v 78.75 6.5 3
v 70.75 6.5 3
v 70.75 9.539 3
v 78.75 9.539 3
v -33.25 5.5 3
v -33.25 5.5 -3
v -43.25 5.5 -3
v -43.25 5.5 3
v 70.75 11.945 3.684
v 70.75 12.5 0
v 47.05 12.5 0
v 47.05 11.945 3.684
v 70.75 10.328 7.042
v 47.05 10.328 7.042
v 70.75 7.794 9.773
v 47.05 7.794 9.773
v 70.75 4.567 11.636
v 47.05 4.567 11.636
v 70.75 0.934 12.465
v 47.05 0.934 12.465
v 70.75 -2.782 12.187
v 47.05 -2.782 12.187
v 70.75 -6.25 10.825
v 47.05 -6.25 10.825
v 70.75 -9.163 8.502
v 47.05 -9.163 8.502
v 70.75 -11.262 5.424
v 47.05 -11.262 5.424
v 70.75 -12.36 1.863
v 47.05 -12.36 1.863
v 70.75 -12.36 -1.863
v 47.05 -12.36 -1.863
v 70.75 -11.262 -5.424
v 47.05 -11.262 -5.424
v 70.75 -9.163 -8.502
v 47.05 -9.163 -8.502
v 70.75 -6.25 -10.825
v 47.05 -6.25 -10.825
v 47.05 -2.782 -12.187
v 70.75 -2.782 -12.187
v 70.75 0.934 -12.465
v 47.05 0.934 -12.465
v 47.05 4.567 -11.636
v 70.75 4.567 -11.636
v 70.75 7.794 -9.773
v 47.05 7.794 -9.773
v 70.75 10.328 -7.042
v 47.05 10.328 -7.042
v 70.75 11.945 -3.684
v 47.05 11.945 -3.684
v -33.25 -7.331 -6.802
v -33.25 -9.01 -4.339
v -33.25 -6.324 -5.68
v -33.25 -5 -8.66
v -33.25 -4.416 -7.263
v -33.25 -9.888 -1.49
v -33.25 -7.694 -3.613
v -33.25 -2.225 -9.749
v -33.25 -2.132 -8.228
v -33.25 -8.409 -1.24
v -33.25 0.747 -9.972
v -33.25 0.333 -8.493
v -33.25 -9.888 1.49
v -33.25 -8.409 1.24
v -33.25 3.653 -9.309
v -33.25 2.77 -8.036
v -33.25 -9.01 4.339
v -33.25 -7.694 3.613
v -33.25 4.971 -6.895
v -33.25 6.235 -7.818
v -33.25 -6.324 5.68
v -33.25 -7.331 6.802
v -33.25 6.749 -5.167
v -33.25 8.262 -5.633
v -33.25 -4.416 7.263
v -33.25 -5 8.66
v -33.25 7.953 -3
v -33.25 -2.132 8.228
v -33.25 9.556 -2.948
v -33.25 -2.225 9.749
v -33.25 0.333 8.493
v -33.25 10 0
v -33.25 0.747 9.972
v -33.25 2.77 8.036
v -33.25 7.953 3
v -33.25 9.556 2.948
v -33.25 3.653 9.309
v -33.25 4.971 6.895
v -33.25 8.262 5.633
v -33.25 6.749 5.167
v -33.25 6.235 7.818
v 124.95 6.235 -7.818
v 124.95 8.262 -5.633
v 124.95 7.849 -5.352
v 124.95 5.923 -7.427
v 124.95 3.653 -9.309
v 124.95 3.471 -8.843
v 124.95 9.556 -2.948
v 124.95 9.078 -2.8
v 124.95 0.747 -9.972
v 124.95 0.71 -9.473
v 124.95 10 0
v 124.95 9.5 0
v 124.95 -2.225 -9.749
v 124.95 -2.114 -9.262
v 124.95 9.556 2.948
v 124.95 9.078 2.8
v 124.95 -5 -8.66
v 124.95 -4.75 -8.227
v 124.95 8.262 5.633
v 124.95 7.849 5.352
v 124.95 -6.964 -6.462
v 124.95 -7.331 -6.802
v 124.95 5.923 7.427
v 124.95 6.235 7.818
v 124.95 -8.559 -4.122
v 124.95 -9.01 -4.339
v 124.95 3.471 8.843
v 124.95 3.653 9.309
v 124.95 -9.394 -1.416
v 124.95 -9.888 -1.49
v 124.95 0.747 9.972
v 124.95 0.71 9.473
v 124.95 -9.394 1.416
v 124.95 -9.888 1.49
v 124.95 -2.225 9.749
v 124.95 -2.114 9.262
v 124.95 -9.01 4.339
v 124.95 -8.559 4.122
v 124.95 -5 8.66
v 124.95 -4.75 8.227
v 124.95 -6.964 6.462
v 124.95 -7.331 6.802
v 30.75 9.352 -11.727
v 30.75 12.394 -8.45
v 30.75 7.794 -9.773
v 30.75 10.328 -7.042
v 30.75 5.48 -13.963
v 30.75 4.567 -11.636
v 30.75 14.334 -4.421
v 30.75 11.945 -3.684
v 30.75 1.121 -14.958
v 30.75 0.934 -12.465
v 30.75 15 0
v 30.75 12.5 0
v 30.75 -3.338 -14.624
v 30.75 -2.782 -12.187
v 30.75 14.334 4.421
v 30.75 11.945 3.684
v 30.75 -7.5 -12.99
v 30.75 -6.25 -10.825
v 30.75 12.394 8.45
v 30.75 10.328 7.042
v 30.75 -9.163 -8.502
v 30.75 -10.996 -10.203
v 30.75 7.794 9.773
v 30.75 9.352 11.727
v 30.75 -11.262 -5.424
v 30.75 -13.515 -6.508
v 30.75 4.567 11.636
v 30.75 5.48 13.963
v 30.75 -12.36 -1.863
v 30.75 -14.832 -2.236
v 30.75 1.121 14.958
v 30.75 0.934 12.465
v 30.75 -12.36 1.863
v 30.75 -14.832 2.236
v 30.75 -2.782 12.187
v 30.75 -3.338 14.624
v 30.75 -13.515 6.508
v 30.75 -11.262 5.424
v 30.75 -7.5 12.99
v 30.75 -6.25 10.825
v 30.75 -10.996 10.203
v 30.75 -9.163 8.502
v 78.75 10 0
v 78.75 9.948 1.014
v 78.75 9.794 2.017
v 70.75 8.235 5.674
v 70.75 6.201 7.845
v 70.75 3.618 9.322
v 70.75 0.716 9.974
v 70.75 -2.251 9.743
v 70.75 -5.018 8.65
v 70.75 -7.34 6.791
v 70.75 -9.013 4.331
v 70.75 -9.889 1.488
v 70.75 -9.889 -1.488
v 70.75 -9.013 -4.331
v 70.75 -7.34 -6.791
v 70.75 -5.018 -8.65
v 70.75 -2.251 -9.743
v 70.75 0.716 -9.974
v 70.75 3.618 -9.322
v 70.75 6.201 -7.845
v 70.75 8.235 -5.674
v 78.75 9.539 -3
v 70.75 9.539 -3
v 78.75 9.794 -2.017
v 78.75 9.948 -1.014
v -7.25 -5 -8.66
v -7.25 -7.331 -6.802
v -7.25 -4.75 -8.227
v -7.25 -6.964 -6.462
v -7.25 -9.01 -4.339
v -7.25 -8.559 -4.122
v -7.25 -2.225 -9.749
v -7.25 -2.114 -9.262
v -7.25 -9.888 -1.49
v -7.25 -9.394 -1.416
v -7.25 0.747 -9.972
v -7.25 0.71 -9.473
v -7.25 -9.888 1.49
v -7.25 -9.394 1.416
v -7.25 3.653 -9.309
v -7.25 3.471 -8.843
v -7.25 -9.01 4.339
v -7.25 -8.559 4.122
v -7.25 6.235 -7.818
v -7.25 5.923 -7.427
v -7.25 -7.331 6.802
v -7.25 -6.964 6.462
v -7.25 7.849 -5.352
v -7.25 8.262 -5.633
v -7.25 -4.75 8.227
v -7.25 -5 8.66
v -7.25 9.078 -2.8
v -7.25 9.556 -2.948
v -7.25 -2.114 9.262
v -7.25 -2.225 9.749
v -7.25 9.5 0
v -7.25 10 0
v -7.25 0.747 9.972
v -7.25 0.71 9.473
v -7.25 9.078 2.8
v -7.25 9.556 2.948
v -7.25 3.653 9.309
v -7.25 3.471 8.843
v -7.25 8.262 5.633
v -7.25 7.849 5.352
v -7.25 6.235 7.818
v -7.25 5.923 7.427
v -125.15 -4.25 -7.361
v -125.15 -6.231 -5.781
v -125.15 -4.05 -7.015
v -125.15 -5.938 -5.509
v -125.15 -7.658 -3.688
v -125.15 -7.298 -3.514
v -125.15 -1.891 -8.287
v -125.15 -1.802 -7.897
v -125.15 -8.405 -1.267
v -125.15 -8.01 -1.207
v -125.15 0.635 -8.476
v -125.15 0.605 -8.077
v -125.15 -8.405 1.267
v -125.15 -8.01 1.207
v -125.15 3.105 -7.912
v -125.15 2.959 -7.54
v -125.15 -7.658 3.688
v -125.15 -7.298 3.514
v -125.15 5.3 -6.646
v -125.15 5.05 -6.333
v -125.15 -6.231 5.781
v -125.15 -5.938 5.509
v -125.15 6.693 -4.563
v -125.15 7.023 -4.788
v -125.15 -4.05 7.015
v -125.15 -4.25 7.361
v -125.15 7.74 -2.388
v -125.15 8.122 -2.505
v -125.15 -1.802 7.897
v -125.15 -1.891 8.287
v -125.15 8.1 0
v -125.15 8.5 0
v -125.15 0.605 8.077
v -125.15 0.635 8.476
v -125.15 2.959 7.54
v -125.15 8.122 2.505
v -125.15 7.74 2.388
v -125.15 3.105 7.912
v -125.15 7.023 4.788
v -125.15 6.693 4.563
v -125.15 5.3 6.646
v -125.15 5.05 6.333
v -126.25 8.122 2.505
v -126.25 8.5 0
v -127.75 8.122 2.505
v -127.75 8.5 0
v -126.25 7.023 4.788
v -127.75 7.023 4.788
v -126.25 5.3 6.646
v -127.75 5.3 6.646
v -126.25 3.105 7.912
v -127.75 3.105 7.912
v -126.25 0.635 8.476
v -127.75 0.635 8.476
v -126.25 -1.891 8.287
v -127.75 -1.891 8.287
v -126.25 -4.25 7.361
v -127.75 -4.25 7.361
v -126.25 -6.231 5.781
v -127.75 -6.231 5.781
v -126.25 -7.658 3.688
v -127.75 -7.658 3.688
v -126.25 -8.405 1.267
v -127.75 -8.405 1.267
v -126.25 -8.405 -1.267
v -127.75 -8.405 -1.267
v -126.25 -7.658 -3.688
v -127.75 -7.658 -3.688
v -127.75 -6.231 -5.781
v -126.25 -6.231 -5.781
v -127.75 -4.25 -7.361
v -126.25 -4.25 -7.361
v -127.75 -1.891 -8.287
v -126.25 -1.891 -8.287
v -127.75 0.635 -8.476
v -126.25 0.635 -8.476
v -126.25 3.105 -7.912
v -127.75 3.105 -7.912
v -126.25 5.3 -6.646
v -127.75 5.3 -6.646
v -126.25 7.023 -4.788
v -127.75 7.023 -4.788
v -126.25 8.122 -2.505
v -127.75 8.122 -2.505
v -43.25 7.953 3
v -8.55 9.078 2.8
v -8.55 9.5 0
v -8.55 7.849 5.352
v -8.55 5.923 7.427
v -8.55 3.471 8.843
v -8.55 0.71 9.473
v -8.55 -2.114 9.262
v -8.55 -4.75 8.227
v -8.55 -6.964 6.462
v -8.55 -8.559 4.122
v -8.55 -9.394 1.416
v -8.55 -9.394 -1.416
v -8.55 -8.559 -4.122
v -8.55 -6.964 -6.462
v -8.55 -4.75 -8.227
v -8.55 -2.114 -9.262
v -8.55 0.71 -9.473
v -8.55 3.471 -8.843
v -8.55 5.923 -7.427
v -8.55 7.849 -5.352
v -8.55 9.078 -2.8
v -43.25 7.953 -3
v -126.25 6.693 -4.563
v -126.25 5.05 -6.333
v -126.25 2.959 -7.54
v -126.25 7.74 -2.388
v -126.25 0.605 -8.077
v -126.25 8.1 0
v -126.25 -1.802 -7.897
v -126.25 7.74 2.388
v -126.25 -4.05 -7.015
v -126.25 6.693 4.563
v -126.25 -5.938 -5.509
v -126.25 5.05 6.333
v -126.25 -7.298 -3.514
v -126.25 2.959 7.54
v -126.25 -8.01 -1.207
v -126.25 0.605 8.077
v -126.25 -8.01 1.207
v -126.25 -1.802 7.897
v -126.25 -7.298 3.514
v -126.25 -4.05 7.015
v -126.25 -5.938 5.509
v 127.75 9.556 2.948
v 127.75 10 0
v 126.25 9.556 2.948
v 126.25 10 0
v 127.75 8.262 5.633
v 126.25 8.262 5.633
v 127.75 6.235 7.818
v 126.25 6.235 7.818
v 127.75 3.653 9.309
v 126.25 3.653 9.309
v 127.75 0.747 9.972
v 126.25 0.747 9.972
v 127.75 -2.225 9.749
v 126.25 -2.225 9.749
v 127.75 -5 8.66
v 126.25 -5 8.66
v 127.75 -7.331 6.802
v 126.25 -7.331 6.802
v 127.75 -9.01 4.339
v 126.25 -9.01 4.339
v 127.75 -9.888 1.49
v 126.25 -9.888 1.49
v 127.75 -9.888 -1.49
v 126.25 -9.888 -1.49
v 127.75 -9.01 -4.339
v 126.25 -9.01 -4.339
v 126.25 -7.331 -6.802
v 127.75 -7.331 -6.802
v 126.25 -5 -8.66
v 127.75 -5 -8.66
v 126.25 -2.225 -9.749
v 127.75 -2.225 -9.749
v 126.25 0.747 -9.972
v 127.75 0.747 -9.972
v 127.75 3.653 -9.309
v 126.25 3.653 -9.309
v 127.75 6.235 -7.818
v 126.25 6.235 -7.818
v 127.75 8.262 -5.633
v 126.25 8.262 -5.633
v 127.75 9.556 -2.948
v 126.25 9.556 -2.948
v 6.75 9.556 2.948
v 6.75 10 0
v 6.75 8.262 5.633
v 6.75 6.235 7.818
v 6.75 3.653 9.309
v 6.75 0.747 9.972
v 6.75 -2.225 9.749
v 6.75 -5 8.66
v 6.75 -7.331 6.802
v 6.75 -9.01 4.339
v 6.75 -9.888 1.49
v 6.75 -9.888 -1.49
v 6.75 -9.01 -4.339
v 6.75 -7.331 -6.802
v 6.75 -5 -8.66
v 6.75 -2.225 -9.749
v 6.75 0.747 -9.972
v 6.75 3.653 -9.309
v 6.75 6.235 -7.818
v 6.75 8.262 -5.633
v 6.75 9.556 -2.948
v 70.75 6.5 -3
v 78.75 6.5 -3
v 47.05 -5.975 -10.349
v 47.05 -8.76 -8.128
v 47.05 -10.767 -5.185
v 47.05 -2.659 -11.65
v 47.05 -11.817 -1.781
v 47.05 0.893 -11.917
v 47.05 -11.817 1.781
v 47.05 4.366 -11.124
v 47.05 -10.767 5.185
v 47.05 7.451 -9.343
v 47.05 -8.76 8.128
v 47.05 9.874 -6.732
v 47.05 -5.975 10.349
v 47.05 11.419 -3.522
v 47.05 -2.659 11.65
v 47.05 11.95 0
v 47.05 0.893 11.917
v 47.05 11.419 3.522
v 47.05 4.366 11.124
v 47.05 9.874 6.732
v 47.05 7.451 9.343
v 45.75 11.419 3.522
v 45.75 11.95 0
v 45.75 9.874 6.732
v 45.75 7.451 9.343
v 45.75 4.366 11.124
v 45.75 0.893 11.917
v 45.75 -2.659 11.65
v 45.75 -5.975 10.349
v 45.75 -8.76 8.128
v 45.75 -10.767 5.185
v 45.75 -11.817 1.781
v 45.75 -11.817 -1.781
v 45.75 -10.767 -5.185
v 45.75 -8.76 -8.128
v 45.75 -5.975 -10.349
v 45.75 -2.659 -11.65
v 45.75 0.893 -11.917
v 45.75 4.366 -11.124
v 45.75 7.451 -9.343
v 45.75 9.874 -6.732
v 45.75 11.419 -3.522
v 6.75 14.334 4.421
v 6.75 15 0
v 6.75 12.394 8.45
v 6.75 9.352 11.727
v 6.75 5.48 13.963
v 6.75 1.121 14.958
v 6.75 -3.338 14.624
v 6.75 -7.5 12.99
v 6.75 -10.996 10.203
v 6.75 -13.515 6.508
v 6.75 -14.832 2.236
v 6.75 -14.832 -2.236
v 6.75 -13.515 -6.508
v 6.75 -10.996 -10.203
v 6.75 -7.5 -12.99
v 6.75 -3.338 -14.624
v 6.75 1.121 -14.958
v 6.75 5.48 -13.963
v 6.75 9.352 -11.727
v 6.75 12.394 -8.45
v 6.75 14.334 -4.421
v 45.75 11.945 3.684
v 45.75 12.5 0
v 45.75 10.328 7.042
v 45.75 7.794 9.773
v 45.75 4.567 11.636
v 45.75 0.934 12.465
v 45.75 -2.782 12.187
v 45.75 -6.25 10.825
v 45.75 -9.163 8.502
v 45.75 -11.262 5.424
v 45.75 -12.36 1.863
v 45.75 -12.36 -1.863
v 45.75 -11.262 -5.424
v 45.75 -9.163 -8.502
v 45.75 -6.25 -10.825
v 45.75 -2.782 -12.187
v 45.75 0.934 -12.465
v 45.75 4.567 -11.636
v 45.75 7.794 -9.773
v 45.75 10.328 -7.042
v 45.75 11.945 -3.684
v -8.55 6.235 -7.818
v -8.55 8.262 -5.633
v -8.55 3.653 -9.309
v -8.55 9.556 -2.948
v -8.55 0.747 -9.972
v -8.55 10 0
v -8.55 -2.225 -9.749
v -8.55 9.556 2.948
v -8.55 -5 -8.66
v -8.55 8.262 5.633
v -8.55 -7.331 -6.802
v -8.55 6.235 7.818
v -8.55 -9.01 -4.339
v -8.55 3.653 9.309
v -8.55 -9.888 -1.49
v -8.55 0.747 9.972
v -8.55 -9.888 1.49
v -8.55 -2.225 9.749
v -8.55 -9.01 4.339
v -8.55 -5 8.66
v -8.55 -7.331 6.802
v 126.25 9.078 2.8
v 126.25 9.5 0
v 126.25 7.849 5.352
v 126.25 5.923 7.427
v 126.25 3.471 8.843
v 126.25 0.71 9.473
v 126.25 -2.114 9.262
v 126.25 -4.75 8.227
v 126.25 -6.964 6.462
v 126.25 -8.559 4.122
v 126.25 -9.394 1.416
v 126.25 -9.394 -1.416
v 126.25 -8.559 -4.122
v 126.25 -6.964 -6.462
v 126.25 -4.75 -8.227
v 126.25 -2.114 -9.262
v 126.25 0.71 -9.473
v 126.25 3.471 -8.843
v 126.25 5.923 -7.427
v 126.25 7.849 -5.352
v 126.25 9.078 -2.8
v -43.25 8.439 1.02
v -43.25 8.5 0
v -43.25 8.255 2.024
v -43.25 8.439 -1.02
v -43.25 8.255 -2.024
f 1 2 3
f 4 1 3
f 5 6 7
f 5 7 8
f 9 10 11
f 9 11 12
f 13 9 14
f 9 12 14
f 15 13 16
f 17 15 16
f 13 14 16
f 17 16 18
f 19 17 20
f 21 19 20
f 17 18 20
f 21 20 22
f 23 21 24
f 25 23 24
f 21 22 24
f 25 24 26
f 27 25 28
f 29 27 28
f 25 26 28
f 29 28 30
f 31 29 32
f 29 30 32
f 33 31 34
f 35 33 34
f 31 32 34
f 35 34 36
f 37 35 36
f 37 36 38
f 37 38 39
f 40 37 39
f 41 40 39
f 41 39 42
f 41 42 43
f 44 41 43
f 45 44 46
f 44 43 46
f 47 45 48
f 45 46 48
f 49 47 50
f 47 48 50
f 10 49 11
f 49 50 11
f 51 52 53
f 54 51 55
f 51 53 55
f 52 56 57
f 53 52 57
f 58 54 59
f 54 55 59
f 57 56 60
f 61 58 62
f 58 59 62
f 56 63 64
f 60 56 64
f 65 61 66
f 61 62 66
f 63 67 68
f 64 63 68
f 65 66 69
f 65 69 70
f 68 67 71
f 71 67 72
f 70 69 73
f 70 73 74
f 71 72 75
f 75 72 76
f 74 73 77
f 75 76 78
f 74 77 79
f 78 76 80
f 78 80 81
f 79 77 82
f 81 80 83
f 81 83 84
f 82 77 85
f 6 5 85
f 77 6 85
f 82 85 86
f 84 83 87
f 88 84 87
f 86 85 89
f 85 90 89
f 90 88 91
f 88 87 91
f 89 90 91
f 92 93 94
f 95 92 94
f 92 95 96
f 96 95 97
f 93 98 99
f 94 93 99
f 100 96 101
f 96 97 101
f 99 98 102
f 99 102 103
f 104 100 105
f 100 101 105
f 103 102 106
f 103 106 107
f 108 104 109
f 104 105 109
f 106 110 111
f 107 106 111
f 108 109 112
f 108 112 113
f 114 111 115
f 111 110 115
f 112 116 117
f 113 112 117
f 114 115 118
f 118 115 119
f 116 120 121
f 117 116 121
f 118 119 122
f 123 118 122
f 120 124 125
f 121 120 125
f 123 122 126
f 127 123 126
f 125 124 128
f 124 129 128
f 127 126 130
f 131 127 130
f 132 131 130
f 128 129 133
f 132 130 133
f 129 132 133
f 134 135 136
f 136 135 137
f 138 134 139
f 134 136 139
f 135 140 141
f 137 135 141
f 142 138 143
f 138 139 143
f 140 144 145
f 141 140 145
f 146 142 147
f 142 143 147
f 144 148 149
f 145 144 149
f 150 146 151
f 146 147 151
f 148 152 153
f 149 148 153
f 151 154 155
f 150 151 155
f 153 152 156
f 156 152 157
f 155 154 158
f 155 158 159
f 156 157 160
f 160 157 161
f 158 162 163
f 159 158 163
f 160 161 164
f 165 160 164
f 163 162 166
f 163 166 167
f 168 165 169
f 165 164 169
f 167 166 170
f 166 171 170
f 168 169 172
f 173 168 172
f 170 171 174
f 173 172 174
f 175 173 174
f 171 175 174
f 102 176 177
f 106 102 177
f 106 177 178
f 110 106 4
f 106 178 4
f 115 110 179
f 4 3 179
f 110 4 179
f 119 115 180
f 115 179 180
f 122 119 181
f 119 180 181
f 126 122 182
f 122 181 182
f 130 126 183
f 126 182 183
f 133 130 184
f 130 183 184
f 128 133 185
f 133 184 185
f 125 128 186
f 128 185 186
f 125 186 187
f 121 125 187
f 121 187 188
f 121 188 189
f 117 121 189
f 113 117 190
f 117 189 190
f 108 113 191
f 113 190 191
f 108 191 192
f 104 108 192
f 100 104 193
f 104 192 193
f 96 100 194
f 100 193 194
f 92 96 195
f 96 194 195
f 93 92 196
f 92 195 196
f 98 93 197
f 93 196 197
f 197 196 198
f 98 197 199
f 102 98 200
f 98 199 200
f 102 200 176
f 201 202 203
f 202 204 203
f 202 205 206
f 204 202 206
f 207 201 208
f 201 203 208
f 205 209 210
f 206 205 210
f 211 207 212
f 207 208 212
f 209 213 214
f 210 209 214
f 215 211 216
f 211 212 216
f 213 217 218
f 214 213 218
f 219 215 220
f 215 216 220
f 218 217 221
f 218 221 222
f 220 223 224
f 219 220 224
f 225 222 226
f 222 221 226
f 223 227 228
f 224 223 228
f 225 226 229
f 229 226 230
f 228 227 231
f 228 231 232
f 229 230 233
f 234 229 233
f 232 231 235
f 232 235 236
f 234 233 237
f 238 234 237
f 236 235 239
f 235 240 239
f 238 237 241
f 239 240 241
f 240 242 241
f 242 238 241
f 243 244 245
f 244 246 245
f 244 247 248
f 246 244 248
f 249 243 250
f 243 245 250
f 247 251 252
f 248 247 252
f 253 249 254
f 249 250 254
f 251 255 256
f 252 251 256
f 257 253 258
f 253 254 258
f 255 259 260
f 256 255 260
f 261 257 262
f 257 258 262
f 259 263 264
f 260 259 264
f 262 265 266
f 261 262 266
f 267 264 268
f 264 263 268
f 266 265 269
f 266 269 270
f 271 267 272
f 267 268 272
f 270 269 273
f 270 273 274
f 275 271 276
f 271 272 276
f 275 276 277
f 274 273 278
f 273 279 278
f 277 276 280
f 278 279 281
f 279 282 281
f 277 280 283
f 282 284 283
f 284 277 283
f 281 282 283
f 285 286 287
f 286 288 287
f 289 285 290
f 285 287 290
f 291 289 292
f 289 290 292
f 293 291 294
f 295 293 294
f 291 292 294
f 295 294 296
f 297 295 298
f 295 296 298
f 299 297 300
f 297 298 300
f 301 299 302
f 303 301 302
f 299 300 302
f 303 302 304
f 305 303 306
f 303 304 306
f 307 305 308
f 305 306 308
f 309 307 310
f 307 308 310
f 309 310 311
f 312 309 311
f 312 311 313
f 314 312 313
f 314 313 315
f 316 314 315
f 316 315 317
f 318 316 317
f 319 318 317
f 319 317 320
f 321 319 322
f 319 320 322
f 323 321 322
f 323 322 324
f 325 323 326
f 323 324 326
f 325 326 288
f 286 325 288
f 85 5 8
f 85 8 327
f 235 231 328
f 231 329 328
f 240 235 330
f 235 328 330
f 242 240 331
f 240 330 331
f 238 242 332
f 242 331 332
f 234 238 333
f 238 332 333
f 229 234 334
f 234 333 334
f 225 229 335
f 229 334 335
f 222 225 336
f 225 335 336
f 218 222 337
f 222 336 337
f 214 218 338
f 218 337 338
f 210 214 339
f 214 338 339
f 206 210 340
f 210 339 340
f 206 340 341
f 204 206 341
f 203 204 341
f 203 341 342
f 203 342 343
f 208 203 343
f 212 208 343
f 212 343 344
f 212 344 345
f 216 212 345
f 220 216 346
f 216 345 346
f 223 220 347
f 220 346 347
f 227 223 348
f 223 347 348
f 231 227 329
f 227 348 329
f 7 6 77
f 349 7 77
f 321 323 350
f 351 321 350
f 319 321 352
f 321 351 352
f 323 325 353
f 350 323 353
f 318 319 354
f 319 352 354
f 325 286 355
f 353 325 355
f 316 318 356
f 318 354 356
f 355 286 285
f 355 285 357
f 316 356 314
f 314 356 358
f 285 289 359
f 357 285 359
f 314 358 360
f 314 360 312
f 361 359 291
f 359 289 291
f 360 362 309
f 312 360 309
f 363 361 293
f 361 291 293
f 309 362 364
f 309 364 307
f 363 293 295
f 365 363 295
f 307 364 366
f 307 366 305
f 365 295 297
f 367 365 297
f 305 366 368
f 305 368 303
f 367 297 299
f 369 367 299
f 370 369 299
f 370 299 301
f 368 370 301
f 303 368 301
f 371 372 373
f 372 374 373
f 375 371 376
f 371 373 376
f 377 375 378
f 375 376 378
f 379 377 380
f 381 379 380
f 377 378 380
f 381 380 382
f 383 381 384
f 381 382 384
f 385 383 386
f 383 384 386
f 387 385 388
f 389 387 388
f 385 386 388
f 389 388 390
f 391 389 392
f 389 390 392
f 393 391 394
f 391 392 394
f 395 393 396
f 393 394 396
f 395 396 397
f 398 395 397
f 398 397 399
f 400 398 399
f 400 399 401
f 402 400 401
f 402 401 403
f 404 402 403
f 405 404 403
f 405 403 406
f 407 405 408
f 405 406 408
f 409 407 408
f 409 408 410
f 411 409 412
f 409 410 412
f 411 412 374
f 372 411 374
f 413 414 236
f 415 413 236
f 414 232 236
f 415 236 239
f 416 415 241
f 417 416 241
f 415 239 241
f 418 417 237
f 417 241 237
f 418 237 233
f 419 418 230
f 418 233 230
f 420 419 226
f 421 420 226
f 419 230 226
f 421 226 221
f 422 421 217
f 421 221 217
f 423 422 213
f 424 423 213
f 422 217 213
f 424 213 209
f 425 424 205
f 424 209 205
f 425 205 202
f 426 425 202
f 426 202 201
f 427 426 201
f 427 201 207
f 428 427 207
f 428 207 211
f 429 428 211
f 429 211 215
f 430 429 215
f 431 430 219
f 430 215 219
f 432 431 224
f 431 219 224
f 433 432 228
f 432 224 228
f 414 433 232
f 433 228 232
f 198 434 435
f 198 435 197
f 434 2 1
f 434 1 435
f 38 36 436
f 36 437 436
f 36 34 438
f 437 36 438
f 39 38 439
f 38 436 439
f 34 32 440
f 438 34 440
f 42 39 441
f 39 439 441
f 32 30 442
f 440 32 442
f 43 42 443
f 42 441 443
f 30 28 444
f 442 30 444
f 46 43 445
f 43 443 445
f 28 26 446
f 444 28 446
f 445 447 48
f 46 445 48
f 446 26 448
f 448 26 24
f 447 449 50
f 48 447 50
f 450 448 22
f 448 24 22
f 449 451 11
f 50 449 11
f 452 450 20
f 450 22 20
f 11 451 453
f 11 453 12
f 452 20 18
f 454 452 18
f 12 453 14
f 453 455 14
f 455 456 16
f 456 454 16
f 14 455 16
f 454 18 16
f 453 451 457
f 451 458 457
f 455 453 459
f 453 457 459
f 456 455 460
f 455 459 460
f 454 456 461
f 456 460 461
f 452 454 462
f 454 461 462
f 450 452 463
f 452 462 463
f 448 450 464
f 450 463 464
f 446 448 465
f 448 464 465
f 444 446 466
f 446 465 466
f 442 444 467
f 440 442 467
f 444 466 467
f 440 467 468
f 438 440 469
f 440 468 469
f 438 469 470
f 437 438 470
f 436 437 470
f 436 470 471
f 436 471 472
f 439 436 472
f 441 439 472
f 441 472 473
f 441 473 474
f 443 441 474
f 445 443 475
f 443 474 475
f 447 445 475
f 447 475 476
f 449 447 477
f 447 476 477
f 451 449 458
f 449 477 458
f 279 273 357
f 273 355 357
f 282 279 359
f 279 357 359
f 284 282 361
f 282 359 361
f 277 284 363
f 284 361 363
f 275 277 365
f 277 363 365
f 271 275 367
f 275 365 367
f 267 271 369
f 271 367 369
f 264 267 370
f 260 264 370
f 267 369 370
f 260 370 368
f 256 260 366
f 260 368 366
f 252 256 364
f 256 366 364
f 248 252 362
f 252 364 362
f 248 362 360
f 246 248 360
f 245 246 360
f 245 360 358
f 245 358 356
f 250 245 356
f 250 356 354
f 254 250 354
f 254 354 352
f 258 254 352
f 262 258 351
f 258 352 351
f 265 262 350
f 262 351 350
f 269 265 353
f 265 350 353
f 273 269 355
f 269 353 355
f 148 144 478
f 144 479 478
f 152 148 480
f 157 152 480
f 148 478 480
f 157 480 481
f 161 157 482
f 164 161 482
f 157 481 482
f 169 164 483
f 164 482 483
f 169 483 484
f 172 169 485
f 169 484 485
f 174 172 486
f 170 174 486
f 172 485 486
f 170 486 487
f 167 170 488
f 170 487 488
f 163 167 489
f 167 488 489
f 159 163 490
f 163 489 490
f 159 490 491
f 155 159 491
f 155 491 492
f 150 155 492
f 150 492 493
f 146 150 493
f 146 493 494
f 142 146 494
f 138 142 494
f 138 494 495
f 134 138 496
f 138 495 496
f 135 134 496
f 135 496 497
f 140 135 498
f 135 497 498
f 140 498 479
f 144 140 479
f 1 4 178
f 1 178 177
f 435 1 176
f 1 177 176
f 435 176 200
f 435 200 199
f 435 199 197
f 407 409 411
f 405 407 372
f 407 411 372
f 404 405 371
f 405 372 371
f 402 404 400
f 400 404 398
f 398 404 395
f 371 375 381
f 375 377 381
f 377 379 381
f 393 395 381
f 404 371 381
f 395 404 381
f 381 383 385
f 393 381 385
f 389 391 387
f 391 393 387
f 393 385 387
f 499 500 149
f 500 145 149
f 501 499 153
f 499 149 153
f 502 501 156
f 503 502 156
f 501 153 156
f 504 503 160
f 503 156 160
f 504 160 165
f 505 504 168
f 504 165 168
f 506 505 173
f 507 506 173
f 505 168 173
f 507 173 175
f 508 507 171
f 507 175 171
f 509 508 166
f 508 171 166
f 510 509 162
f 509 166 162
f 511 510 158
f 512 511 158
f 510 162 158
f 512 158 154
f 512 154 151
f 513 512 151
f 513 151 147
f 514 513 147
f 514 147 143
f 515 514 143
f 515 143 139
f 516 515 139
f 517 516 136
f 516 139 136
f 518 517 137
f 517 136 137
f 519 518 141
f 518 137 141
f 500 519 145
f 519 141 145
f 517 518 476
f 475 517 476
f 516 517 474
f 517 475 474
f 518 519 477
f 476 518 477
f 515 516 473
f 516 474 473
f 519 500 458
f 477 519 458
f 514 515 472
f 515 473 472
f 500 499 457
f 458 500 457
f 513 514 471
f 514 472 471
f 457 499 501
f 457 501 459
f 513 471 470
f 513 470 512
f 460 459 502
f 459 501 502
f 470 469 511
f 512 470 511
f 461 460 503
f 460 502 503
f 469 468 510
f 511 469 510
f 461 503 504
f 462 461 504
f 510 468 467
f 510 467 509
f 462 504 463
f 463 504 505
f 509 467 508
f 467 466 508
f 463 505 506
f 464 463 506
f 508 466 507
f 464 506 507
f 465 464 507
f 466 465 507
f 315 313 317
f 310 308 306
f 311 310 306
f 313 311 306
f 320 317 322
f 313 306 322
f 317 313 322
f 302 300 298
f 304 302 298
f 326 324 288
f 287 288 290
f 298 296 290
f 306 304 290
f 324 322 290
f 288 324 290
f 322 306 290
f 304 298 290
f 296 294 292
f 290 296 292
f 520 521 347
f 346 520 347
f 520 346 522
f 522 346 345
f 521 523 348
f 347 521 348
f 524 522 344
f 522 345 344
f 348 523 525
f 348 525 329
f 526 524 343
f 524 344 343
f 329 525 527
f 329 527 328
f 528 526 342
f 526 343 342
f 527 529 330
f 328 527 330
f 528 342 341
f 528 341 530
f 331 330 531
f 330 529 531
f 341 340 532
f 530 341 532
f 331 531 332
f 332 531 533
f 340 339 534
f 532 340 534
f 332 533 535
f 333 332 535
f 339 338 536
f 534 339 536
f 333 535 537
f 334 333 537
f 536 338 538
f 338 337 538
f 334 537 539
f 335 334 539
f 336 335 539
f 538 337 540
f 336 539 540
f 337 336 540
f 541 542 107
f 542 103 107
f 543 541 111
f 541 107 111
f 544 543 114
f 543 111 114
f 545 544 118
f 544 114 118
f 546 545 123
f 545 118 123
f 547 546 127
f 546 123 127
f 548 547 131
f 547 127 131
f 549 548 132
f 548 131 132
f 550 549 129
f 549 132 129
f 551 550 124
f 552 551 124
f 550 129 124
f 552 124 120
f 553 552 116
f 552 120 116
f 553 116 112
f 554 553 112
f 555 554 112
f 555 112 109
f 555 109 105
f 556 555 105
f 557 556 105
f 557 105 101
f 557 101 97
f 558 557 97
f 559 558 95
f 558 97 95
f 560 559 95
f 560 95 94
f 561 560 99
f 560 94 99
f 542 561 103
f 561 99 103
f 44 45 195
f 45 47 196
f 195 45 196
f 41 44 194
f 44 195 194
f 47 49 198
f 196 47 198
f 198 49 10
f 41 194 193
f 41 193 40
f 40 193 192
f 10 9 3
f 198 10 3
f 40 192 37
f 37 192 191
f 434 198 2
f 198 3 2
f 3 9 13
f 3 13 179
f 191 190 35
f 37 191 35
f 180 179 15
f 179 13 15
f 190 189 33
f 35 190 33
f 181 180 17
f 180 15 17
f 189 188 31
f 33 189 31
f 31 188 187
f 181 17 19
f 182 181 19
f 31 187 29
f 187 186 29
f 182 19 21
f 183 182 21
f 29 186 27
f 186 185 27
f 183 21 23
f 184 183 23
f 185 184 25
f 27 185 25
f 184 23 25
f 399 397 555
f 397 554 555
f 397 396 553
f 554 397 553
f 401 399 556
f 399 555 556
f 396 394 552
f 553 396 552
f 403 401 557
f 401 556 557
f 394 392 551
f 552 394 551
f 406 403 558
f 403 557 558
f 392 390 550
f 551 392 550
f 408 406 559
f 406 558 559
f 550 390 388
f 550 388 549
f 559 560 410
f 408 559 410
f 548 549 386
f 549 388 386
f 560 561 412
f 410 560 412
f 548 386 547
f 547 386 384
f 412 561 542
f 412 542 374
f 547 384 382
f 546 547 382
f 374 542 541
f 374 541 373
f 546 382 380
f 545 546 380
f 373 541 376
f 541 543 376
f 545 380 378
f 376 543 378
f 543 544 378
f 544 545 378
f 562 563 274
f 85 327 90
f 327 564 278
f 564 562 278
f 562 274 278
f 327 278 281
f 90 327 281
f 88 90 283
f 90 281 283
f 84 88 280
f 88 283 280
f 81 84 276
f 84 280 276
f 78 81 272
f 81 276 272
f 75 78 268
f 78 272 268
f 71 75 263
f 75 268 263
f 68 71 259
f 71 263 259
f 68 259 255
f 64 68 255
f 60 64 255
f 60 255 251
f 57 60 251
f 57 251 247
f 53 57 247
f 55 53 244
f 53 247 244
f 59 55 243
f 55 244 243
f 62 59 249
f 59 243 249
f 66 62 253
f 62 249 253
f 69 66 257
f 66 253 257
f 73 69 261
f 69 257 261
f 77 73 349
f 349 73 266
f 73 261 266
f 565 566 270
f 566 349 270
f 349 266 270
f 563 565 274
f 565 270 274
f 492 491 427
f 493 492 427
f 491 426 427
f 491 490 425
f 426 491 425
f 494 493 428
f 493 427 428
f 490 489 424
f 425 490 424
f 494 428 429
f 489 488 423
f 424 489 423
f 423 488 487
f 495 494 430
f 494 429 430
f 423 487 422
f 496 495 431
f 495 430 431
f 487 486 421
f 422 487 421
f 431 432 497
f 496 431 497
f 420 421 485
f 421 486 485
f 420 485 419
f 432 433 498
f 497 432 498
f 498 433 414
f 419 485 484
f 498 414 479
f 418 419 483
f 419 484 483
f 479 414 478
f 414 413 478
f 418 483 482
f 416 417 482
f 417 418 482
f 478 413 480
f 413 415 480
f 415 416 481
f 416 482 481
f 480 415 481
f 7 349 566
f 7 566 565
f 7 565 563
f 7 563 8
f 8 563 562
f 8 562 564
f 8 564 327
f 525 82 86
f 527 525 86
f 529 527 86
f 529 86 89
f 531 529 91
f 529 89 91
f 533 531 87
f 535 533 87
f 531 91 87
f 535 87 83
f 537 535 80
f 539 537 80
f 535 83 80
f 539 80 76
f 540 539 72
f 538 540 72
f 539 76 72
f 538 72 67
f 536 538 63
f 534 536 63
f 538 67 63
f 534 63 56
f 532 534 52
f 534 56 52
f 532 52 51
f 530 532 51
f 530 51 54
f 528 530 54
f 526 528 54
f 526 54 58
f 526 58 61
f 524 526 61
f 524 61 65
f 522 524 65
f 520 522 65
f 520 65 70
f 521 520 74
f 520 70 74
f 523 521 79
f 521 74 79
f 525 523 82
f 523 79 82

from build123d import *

# Parameters (mm, degrees)
SKETCH2_W          = 6
SKETCH2_H          = 5.3
CUT_EXTRUDE1_DEPTH = 10
SKETCH3_W          = 6
SKETCH3_H          = 3.5
CUT_EXTRUDE2_DEPTH = 8


with BuildPart() as part:
    # Sketch1 → Revolve1 (revolve)
    with BuildSketch(Plane.XY):
        Polygon((-127.75, 0), (127.75, 0), (127.75, 10), (126.25, 10), (126.25, 9.5), (124.95, 9.5), (124.95, 10), (70.75, 10), (70.75, 12.5), (47.05, 12.5), (47.05, 11.95), (45.75, 11.95), (45.75, 12.5), (30.75, 12.5), (30.75, 15), (6.75, 15), (6.75, 10), (-7.25, 10), (-7.25, 9.5), (-8.55, 9.5), (-8.55, 10), (-33.25, 10), (-33.25, 8.5), (-125.15, 8.5), (-125.15, 8.1), (-126.25, 8.1), (-126.25, 8.5), (-127.75, 8.5), align=None)
    revolve(axis=Axis((-127.75, 0, 0), (1, 0, 0)))

    # Sketch2 → Cut-Extrude1 (cut)
    with BuildSketch(Plane.ZY.offset(33.25)):
        with Locations((0, 8.15)):
            Rectangle(SKETCH2_W, SKETCH2_H)
    extrude(amount=CUT_EXTRUDE1_DEPTH, mode=Mode.SUBTRACT)

    # Sketch3 → Cut-Extrude2 (cut)
    with BuildSketch(Plane(origin=(70.75, 0, 0), x_dir=(0, 0, -1), z_dir=(1, 0, 0))):
        with Locations((0, 8.25)):
            Rectangle(SKETCH3_W, SKETCH3_H)
    extrude(amount=CUT_EXTRUDE2_DEPTH, mode=Mode.SUBTRACT)


solid = part.part
